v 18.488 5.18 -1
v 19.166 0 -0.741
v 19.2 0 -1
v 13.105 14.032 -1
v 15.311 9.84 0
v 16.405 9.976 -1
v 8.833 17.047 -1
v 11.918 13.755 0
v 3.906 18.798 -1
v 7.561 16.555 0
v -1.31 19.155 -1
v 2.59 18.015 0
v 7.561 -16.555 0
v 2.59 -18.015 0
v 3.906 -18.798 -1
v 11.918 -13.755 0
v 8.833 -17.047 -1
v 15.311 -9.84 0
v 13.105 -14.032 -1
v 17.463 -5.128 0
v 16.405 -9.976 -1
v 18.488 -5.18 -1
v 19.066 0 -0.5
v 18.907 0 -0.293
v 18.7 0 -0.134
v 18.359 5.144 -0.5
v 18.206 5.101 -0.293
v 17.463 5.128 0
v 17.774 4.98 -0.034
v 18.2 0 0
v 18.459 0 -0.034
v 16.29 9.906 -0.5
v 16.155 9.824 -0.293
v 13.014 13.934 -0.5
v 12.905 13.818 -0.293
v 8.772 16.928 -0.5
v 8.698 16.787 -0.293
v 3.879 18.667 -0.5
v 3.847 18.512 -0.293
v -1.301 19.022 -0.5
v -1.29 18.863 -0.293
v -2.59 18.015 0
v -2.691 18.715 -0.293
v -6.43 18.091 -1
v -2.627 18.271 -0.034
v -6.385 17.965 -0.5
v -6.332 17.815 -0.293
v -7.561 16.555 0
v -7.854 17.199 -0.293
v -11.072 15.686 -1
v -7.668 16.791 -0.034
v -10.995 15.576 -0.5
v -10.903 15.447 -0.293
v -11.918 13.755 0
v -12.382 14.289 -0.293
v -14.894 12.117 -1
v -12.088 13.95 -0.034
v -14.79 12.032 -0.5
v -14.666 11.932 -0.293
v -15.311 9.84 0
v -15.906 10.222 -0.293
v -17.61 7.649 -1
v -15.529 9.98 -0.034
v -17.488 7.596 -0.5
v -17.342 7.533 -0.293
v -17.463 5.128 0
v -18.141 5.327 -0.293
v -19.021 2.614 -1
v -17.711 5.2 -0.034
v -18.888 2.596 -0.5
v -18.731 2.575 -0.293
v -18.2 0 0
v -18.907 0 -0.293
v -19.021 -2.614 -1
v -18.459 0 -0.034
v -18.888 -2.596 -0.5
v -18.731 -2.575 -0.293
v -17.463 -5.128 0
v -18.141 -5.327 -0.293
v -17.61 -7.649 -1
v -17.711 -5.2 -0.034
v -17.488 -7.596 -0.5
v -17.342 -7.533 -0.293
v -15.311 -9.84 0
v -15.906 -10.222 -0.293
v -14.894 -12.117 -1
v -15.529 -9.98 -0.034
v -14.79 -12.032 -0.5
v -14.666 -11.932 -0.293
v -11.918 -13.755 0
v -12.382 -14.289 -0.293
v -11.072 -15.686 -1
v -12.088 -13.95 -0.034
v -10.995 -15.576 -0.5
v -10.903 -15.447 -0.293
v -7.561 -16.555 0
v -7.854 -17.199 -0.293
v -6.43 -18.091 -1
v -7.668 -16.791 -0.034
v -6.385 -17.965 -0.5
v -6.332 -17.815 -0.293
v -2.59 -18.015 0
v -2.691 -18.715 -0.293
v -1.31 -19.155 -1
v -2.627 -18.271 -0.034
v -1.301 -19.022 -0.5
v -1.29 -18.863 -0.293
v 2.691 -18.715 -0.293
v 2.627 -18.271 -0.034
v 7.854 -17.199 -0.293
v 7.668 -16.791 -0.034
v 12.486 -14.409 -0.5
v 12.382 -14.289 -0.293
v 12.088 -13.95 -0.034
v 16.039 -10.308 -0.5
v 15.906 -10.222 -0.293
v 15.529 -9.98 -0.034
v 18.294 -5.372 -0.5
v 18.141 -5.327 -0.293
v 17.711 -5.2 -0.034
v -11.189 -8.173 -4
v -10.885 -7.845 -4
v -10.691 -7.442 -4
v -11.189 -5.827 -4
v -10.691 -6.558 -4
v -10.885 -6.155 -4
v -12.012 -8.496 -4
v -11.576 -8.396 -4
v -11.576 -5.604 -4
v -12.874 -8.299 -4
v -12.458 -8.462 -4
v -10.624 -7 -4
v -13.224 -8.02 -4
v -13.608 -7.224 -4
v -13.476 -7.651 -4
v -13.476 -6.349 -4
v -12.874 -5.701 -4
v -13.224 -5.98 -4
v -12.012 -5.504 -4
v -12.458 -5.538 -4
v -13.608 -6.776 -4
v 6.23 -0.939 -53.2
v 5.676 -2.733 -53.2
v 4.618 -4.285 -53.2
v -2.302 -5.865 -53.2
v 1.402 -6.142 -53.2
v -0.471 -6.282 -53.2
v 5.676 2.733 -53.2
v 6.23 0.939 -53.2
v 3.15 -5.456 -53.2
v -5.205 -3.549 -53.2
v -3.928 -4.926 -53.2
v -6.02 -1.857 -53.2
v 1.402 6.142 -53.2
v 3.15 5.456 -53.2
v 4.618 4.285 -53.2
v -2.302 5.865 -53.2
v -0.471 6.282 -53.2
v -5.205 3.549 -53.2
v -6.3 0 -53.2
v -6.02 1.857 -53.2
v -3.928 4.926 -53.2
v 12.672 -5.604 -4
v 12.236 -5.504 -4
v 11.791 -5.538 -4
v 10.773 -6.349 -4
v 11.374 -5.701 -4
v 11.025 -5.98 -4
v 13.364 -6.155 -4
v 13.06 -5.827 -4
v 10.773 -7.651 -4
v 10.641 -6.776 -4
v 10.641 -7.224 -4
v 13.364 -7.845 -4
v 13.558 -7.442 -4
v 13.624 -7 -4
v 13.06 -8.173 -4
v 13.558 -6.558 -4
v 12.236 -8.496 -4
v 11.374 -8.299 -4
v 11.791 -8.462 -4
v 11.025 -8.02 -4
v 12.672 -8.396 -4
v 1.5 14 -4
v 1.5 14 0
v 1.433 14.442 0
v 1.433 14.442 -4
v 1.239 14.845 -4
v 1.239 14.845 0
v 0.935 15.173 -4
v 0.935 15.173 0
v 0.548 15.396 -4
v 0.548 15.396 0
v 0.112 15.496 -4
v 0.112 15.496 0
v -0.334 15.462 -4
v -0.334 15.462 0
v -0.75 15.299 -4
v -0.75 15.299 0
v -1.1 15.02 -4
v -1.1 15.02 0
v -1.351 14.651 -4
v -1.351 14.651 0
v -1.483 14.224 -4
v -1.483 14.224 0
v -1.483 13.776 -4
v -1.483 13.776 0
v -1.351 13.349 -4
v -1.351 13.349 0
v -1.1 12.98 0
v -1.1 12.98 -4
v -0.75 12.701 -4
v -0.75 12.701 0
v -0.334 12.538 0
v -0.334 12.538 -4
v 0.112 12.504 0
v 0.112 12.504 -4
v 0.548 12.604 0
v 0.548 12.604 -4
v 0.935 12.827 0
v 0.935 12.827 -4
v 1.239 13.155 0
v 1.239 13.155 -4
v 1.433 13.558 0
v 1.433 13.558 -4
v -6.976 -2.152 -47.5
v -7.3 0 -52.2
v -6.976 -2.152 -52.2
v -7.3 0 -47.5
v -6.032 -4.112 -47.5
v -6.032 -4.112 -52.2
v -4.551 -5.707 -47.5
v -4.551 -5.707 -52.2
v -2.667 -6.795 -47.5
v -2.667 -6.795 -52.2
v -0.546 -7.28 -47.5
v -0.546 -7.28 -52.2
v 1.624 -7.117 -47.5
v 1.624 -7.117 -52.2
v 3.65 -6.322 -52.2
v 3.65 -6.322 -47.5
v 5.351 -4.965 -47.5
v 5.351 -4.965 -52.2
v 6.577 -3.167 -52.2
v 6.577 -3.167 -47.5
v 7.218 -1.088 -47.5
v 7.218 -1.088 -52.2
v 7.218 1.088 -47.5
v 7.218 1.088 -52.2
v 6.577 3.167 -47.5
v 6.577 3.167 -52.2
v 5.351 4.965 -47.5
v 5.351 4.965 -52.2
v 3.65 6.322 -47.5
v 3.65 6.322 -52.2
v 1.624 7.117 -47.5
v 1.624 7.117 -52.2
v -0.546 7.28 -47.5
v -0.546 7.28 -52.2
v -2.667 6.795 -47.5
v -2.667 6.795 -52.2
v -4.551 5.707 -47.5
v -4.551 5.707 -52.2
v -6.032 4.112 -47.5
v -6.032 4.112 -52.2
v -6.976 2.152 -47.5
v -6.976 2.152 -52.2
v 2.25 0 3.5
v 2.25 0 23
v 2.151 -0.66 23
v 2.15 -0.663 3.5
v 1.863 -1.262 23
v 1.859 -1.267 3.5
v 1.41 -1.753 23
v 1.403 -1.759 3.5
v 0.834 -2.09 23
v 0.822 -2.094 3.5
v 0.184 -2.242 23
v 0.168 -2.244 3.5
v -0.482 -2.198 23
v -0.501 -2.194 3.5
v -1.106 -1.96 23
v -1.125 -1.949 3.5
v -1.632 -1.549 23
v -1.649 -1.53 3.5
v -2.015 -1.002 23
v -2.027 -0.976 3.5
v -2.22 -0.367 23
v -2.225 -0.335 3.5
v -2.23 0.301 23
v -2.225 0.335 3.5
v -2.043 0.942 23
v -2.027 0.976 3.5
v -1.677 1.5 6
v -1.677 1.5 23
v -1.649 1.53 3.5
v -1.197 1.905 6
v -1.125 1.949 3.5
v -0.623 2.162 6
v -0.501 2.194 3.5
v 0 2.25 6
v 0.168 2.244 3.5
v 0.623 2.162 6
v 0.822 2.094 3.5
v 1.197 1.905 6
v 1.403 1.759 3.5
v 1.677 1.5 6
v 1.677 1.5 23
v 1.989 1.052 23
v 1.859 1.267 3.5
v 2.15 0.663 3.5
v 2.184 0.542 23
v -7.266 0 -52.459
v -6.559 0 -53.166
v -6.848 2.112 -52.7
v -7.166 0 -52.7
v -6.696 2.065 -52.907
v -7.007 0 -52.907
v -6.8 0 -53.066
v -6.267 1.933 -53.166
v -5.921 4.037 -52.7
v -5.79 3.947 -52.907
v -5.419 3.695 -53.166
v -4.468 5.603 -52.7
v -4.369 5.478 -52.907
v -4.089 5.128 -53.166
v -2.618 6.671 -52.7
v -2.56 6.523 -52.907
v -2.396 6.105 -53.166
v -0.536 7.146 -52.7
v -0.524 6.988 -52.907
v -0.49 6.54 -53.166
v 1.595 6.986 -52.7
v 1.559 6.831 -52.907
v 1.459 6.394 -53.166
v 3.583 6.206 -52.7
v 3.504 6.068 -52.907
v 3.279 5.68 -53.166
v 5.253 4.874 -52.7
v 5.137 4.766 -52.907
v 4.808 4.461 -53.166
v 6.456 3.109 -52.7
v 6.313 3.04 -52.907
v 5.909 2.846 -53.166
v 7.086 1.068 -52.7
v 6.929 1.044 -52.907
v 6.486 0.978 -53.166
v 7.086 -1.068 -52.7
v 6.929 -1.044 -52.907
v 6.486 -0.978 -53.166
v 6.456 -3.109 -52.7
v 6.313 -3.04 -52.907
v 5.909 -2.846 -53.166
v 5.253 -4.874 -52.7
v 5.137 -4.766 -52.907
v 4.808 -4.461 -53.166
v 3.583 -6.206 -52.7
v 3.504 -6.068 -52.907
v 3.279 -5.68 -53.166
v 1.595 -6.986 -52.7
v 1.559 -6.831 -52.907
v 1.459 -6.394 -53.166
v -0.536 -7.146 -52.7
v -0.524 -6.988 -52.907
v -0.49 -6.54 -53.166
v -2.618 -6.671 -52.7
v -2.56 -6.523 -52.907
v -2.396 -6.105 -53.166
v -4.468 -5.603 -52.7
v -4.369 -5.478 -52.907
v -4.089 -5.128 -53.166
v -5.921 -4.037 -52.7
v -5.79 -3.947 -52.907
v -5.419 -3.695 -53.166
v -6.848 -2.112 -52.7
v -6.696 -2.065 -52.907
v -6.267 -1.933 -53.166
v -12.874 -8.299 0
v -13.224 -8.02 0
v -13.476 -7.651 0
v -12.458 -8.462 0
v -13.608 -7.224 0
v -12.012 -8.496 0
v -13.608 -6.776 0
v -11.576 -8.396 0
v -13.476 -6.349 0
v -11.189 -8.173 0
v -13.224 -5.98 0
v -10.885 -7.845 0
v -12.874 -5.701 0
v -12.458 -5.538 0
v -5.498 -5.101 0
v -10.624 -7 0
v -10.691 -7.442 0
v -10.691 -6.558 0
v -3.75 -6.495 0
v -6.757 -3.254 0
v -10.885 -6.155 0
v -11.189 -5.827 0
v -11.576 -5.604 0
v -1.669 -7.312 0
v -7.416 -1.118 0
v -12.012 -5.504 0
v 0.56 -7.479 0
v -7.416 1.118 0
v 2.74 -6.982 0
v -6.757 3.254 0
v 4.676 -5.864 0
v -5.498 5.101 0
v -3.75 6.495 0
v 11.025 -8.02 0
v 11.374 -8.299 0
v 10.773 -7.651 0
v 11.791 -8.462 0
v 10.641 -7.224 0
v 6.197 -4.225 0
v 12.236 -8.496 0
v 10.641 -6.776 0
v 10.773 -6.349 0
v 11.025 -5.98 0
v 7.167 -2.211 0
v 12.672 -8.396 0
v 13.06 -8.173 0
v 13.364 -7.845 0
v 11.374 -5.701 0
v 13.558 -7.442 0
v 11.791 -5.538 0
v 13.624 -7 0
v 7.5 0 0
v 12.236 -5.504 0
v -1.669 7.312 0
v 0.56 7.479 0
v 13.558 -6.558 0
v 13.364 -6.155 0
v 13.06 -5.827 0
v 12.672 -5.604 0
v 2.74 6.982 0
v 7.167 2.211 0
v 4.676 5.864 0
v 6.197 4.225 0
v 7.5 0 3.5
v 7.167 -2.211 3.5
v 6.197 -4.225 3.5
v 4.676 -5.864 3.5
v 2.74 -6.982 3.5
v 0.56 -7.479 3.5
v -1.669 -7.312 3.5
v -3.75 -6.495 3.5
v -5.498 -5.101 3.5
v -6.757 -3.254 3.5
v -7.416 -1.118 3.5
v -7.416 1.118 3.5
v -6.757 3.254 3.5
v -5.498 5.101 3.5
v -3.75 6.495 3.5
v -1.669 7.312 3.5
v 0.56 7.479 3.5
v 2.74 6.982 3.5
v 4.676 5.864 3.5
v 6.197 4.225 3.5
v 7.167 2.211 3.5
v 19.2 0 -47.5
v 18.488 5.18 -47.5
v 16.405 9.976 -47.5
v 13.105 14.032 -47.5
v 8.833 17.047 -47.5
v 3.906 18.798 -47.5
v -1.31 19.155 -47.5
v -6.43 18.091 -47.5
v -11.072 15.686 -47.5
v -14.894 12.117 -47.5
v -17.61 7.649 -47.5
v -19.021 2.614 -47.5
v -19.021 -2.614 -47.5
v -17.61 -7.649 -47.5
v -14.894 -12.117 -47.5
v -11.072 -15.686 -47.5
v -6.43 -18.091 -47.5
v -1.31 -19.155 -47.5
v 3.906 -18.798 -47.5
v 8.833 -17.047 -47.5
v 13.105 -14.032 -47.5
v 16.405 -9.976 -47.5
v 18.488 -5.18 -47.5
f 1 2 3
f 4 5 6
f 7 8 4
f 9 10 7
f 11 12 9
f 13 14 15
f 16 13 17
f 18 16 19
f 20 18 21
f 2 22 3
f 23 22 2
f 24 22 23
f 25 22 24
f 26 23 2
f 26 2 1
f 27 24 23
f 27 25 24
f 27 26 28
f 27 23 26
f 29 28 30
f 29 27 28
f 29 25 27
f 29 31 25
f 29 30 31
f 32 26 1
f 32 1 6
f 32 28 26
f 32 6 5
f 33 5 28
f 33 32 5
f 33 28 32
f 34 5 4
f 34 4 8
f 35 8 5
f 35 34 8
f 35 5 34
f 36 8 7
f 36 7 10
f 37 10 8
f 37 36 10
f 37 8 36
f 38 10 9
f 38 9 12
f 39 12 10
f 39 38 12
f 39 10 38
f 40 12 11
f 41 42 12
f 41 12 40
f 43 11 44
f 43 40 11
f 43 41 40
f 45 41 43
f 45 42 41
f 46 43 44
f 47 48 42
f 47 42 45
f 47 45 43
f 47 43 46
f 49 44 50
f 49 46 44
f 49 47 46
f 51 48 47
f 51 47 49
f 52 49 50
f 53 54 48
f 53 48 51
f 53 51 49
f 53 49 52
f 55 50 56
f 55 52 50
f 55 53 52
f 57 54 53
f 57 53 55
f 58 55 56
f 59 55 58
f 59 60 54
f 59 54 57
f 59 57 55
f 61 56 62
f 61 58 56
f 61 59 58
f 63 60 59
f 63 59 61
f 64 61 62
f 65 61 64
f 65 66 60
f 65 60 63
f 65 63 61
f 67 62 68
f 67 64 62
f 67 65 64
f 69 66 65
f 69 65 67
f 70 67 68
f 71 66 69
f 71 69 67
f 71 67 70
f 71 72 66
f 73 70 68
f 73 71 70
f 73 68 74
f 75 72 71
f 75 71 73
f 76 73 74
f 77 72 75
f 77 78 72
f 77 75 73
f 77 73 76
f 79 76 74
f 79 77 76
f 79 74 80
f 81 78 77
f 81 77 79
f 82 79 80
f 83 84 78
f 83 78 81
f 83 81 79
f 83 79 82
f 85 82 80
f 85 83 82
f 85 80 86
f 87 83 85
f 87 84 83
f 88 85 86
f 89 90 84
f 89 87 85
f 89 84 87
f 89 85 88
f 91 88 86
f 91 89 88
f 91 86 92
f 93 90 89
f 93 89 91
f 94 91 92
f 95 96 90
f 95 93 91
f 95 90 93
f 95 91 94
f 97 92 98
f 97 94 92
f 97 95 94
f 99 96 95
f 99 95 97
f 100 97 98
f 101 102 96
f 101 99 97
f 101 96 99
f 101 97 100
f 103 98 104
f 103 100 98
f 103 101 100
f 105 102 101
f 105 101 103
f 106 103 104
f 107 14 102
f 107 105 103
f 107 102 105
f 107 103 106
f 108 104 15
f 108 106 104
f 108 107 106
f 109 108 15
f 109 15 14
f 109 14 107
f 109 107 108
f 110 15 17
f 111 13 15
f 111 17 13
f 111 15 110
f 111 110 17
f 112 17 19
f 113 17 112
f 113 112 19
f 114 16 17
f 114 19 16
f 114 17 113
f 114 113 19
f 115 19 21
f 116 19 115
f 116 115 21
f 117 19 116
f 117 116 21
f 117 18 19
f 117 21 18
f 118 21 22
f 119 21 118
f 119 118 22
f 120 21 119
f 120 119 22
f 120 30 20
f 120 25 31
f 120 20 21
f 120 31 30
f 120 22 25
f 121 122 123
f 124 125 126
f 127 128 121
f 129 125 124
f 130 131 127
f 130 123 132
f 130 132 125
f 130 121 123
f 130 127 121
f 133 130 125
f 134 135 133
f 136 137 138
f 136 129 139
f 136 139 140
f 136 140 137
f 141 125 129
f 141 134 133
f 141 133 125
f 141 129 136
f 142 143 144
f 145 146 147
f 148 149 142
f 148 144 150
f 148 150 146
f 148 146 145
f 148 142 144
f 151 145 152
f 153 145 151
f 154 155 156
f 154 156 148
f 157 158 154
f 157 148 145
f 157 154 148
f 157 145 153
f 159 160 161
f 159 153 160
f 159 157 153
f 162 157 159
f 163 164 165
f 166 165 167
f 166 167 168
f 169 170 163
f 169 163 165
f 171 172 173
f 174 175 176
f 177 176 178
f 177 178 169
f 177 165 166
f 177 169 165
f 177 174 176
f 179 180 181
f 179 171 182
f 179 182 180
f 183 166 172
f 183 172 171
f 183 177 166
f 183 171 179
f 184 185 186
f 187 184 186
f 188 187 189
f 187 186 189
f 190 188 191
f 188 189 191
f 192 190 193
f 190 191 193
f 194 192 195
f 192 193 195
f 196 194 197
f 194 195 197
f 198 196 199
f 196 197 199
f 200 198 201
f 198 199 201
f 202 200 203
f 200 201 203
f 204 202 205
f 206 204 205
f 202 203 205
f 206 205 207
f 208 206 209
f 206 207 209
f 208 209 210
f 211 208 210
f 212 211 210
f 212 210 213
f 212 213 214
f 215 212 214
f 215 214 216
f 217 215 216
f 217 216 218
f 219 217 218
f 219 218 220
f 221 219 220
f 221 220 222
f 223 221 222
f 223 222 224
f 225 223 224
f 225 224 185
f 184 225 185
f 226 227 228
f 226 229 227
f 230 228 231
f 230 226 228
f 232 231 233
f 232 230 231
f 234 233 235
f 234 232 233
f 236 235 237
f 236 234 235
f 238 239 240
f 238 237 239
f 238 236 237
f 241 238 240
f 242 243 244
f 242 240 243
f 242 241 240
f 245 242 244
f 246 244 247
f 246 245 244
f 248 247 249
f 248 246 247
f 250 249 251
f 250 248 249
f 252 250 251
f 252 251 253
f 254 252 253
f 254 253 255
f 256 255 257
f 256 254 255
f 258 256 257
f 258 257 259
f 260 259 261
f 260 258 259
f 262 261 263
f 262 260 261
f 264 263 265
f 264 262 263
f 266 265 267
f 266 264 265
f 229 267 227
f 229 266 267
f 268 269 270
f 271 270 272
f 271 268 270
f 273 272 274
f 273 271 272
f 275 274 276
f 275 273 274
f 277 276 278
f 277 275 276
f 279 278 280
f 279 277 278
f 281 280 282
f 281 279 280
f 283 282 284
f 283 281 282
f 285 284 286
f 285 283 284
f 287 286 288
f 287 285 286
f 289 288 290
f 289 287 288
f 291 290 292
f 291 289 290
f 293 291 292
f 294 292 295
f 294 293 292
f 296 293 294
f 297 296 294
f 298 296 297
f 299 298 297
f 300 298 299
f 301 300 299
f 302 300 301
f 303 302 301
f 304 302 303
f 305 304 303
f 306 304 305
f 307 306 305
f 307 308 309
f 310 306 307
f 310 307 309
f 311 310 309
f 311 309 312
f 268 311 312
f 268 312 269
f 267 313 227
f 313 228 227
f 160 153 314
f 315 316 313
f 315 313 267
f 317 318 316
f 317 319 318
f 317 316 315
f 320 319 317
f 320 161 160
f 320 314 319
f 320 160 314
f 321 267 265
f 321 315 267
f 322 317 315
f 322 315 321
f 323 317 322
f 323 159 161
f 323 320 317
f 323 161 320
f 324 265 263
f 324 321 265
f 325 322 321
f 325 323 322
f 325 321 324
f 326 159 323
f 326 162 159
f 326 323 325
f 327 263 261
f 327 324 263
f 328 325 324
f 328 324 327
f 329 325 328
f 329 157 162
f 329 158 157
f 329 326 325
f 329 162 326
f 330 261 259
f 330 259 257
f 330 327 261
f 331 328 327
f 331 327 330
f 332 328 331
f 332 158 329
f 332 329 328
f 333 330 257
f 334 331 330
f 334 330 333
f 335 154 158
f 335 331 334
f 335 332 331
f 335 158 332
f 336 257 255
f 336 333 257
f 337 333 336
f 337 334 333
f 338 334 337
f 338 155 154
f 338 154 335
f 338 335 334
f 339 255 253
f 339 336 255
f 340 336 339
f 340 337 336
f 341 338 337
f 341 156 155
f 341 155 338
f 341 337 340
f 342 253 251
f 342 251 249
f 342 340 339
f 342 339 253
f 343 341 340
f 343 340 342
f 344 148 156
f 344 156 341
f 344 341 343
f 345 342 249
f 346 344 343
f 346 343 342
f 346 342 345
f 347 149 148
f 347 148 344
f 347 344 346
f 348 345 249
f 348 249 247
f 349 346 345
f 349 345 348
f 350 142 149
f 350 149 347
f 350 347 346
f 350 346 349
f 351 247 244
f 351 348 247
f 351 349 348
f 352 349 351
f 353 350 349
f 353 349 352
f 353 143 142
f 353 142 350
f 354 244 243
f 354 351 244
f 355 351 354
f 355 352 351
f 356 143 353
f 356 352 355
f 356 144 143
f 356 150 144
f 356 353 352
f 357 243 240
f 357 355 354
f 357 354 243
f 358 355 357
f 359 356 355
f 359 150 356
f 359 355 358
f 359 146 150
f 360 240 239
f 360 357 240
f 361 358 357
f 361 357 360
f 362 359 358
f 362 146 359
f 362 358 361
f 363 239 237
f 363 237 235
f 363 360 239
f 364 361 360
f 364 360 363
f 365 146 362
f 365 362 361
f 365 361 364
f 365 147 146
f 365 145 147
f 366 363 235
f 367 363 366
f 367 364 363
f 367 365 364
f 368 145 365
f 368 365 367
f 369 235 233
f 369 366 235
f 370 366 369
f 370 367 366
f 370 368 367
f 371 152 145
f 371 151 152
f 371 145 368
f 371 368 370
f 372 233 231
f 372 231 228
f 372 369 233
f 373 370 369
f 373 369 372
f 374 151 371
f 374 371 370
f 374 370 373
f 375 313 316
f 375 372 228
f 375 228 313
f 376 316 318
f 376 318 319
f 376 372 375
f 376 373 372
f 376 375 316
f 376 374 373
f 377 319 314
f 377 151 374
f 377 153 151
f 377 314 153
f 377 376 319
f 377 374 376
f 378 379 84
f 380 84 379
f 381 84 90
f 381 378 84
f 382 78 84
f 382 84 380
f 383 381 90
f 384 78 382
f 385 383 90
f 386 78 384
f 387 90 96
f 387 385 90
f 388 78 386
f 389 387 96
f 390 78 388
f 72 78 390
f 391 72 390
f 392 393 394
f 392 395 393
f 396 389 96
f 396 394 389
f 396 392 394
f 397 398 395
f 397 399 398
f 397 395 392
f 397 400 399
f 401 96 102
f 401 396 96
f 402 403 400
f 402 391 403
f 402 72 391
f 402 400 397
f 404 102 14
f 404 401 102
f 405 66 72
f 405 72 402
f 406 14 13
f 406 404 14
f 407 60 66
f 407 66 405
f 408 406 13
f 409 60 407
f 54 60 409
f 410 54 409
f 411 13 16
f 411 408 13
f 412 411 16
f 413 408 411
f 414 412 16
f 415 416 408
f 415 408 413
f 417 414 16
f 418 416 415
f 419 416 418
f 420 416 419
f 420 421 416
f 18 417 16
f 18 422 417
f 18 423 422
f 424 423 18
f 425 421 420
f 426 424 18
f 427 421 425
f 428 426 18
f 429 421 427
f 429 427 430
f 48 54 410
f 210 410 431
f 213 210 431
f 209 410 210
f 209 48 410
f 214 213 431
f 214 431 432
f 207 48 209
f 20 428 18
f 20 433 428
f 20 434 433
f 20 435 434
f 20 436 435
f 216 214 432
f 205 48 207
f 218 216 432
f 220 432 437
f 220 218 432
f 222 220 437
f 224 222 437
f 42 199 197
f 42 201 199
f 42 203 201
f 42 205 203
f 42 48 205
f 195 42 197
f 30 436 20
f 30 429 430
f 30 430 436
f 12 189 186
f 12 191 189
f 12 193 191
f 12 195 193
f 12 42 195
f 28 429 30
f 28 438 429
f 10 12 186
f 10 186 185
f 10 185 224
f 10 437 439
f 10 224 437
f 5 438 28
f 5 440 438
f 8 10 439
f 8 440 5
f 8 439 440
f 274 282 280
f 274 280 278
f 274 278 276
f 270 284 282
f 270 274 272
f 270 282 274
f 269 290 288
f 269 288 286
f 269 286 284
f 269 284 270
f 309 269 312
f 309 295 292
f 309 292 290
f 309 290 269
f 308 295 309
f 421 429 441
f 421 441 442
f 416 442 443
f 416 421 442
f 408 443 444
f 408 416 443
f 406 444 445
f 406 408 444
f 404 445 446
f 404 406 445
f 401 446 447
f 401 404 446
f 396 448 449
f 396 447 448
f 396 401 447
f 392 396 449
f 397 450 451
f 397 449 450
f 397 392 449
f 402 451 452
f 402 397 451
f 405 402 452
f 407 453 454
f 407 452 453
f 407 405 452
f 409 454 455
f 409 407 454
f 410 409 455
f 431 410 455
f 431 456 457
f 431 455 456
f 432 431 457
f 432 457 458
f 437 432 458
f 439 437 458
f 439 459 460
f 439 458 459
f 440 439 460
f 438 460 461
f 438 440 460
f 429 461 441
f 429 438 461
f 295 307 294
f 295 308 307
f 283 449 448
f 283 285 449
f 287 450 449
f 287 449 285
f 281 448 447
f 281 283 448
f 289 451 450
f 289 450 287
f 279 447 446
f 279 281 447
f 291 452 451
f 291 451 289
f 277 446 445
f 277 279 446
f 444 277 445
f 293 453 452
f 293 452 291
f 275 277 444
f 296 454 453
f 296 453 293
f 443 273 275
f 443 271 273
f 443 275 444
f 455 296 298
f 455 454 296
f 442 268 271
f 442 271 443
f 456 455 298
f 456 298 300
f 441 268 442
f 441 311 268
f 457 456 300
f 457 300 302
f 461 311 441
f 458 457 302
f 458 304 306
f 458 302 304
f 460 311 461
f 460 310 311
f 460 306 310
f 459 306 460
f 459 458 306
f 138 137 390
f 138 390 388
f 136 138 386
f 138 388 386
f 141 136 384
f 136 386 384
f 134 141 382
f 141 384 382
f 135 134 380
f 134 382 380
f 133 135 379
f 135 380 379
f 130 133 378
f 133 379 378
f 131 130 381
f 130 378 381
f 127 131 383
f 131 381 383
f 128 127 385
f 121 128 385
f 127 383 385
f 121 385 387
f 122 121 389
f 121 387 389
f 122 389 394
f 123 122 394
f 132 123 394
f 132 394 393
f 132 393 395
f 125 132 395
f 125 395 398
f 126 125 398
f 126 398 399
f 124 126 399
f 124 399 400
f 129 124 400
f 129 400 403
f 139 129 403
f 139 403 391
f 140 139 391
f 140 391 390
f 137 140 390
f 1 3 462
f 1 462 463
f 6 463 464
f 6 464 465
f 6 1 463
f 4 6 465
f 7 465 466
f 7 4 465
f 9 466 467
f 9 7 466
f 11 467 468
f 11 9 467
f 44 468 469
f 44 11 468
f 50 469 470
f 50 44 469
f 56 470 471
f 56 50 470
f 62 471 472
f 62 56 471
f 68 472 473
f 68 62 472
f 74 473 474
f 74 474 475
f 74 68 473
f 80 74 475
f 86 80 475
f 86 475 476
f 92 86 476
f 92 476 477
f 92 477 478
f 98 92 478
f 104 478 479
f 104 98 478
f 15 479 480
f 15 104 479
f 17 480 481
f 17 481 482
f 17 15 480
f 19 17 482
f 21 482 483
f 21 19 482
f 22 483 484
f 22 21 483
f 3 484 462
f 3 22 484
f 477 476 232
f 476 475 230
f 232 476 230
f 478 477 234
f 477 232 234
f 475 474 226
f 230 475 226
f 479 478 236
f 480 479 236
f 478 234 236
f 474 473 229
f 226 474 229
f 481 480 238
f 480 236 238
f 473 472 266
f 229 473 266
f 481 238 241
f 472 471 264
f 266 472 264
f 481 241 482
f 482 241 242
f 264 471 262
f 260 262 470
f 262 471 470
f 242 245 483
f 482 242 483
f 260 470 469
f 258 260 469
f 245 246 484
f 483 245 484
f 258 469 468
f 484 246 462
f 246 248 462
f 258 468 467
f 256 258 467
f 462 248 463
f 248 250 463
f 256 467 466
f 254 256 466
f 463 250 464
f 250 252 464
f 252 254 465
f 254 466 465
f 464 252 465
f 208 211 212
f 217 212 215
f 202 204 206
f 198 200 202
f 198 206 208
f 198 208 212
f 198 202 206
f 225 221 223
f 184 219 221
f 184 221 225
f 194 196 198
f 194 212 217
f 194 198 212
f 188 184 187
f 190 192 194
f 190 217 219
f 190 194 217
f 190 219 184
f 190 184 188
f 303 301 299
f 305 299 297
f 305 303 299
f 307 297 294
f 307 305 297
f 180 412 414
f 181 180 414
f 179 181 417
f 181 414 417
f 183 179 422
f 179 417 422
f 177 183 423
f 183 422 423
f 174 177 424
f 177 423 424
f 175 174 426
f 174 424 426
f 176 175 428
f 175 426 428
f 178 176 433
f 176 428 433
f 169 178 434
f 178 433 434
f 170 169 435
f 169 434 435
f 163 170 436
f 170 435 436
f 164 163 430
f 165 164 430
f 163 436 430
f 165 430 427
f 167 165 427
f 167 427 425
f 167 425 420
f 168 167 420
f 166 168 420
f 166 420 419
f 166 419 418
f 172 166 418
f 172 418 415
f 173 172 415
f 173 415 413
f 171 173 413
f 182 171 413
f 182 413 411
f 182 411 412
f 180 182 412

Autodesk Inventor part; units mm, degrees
ref_plane "YZ Plane" through (0, 0, 0) normal (1, 0, 0) x (0, 1, 0)
ref_plane "XZ Plane" through (0, 0, 0) normal (0, 1, 0) x (-1, 0, 0)
ref_plane "XY Plane" through (0, 0, 0) normal (0, 0, 1) x (1, 0, 0)
sketch "Esquisse1" plane through (0, 0, 0) normal (0, 0, 1) x (1, 0, 0)
  circle A0 centre (0, 0) radius 19.2
  dimension "d0" = 38.4
extrude "Extrusion1" add sketch "Esquisse1" against normal blind 47.5
sketch "Esquisse2" plane through (0, 0, 0) normal (0, 0, 1) x (1, 0, 0)
  circle A0 centre (0, 0) radius 19.2 projected
  circle A1 centre (0, 0) radius 7.5
  dimension "d3" = 15
extrude "Extrusion2" add sketch "Esquisse2" along normal blind 3.5 contours A1
sketch "Esquisse3" plane through (0, 0, 3.5) normal (0, 0, 1) x (1, 0, 0)
  circle A0 centre (0, 0) radius 7.5 projected
  circle A1 centre (0, 0) radius 2.25
  dimension "d6" = 4.5
extrude "Extrusion3" add sketch "Esquisse3" along normal blind 19.5 contours A1
sketch "Esquisse4" plane through (0, 0, -47.5) normal (0, 0, -1) x (-1, 0, 0)
  circle A0 centre (0, 0) radius 19.2 projected
  circle A1 centre (0, 0) radius 7.3
  dimension "d9" = 14.6
extrude "Extrusion4" add sketch "Esquisse4" along normal blind 5.7 contours A1
fillet "Congé1" radius 1 1 edges at (7.3, 0, -53.2)
fillet "Congé2" radius 1 1 edges at (-19.2, 0, 0)
sketch "Esquisse6" plane through (0, 0, 23) normal (0, 0, 1) x (1, 0, 0)
  circle A0 centre (0, 0) radius 2.25 projected
  line L0 (-3, 3.5) -> (3, 3.5)
  line L1 (3, 3.5) -> (3, 1.5)
  line L2 (3, 1.5) -> (-3, 1.5)
  line L3 (-3, 1.5) -> (-3, 3.5)
  dimension "d14" = 1.5
  dimension "d15" = 2
  dimension "d16" = 6
  dimension "d17" = 3
extrude "Extrusion5" cut sketch "Esquisse6" against normal blind 17 contours L2 A0 | A0 L2 L3 L0 L1 picked at (-0.424, 1.6187)
sketch "Esquisse7" plane through (0, 0, 0) normal (0, 0, 1) x (1, 0, 0)
  circle A0 centre (0, 0) radius 7.5 projected
  circle A1 centre (0, 14) radius 1.5
  dimension "d20" = 3
  dimension "d21" = 14
extrude "Extrusion6" cut sketch "Esquisse7" against normal blind 4 contours A1
thread "Filetage1" size "M3x0.5" class "6H" standard "ANSI Metric M Profile" full length
pattern_circular "Réseau circulaire1" count 3 over 360 about axis through (0, 0, 0) along (0, 0, -1) of "Extrusion6"
thread "Filetage2" size "M3x0.5" class "6H" standard "ANSI Metric M Profile" full length
thread "Filetage3" size "M3x0.5" class "6H" standard "ANSI Metric M Profile" full length
equation "\"d17\" = 0.5 * d16"
properties part number "Nidec_DMN37"
